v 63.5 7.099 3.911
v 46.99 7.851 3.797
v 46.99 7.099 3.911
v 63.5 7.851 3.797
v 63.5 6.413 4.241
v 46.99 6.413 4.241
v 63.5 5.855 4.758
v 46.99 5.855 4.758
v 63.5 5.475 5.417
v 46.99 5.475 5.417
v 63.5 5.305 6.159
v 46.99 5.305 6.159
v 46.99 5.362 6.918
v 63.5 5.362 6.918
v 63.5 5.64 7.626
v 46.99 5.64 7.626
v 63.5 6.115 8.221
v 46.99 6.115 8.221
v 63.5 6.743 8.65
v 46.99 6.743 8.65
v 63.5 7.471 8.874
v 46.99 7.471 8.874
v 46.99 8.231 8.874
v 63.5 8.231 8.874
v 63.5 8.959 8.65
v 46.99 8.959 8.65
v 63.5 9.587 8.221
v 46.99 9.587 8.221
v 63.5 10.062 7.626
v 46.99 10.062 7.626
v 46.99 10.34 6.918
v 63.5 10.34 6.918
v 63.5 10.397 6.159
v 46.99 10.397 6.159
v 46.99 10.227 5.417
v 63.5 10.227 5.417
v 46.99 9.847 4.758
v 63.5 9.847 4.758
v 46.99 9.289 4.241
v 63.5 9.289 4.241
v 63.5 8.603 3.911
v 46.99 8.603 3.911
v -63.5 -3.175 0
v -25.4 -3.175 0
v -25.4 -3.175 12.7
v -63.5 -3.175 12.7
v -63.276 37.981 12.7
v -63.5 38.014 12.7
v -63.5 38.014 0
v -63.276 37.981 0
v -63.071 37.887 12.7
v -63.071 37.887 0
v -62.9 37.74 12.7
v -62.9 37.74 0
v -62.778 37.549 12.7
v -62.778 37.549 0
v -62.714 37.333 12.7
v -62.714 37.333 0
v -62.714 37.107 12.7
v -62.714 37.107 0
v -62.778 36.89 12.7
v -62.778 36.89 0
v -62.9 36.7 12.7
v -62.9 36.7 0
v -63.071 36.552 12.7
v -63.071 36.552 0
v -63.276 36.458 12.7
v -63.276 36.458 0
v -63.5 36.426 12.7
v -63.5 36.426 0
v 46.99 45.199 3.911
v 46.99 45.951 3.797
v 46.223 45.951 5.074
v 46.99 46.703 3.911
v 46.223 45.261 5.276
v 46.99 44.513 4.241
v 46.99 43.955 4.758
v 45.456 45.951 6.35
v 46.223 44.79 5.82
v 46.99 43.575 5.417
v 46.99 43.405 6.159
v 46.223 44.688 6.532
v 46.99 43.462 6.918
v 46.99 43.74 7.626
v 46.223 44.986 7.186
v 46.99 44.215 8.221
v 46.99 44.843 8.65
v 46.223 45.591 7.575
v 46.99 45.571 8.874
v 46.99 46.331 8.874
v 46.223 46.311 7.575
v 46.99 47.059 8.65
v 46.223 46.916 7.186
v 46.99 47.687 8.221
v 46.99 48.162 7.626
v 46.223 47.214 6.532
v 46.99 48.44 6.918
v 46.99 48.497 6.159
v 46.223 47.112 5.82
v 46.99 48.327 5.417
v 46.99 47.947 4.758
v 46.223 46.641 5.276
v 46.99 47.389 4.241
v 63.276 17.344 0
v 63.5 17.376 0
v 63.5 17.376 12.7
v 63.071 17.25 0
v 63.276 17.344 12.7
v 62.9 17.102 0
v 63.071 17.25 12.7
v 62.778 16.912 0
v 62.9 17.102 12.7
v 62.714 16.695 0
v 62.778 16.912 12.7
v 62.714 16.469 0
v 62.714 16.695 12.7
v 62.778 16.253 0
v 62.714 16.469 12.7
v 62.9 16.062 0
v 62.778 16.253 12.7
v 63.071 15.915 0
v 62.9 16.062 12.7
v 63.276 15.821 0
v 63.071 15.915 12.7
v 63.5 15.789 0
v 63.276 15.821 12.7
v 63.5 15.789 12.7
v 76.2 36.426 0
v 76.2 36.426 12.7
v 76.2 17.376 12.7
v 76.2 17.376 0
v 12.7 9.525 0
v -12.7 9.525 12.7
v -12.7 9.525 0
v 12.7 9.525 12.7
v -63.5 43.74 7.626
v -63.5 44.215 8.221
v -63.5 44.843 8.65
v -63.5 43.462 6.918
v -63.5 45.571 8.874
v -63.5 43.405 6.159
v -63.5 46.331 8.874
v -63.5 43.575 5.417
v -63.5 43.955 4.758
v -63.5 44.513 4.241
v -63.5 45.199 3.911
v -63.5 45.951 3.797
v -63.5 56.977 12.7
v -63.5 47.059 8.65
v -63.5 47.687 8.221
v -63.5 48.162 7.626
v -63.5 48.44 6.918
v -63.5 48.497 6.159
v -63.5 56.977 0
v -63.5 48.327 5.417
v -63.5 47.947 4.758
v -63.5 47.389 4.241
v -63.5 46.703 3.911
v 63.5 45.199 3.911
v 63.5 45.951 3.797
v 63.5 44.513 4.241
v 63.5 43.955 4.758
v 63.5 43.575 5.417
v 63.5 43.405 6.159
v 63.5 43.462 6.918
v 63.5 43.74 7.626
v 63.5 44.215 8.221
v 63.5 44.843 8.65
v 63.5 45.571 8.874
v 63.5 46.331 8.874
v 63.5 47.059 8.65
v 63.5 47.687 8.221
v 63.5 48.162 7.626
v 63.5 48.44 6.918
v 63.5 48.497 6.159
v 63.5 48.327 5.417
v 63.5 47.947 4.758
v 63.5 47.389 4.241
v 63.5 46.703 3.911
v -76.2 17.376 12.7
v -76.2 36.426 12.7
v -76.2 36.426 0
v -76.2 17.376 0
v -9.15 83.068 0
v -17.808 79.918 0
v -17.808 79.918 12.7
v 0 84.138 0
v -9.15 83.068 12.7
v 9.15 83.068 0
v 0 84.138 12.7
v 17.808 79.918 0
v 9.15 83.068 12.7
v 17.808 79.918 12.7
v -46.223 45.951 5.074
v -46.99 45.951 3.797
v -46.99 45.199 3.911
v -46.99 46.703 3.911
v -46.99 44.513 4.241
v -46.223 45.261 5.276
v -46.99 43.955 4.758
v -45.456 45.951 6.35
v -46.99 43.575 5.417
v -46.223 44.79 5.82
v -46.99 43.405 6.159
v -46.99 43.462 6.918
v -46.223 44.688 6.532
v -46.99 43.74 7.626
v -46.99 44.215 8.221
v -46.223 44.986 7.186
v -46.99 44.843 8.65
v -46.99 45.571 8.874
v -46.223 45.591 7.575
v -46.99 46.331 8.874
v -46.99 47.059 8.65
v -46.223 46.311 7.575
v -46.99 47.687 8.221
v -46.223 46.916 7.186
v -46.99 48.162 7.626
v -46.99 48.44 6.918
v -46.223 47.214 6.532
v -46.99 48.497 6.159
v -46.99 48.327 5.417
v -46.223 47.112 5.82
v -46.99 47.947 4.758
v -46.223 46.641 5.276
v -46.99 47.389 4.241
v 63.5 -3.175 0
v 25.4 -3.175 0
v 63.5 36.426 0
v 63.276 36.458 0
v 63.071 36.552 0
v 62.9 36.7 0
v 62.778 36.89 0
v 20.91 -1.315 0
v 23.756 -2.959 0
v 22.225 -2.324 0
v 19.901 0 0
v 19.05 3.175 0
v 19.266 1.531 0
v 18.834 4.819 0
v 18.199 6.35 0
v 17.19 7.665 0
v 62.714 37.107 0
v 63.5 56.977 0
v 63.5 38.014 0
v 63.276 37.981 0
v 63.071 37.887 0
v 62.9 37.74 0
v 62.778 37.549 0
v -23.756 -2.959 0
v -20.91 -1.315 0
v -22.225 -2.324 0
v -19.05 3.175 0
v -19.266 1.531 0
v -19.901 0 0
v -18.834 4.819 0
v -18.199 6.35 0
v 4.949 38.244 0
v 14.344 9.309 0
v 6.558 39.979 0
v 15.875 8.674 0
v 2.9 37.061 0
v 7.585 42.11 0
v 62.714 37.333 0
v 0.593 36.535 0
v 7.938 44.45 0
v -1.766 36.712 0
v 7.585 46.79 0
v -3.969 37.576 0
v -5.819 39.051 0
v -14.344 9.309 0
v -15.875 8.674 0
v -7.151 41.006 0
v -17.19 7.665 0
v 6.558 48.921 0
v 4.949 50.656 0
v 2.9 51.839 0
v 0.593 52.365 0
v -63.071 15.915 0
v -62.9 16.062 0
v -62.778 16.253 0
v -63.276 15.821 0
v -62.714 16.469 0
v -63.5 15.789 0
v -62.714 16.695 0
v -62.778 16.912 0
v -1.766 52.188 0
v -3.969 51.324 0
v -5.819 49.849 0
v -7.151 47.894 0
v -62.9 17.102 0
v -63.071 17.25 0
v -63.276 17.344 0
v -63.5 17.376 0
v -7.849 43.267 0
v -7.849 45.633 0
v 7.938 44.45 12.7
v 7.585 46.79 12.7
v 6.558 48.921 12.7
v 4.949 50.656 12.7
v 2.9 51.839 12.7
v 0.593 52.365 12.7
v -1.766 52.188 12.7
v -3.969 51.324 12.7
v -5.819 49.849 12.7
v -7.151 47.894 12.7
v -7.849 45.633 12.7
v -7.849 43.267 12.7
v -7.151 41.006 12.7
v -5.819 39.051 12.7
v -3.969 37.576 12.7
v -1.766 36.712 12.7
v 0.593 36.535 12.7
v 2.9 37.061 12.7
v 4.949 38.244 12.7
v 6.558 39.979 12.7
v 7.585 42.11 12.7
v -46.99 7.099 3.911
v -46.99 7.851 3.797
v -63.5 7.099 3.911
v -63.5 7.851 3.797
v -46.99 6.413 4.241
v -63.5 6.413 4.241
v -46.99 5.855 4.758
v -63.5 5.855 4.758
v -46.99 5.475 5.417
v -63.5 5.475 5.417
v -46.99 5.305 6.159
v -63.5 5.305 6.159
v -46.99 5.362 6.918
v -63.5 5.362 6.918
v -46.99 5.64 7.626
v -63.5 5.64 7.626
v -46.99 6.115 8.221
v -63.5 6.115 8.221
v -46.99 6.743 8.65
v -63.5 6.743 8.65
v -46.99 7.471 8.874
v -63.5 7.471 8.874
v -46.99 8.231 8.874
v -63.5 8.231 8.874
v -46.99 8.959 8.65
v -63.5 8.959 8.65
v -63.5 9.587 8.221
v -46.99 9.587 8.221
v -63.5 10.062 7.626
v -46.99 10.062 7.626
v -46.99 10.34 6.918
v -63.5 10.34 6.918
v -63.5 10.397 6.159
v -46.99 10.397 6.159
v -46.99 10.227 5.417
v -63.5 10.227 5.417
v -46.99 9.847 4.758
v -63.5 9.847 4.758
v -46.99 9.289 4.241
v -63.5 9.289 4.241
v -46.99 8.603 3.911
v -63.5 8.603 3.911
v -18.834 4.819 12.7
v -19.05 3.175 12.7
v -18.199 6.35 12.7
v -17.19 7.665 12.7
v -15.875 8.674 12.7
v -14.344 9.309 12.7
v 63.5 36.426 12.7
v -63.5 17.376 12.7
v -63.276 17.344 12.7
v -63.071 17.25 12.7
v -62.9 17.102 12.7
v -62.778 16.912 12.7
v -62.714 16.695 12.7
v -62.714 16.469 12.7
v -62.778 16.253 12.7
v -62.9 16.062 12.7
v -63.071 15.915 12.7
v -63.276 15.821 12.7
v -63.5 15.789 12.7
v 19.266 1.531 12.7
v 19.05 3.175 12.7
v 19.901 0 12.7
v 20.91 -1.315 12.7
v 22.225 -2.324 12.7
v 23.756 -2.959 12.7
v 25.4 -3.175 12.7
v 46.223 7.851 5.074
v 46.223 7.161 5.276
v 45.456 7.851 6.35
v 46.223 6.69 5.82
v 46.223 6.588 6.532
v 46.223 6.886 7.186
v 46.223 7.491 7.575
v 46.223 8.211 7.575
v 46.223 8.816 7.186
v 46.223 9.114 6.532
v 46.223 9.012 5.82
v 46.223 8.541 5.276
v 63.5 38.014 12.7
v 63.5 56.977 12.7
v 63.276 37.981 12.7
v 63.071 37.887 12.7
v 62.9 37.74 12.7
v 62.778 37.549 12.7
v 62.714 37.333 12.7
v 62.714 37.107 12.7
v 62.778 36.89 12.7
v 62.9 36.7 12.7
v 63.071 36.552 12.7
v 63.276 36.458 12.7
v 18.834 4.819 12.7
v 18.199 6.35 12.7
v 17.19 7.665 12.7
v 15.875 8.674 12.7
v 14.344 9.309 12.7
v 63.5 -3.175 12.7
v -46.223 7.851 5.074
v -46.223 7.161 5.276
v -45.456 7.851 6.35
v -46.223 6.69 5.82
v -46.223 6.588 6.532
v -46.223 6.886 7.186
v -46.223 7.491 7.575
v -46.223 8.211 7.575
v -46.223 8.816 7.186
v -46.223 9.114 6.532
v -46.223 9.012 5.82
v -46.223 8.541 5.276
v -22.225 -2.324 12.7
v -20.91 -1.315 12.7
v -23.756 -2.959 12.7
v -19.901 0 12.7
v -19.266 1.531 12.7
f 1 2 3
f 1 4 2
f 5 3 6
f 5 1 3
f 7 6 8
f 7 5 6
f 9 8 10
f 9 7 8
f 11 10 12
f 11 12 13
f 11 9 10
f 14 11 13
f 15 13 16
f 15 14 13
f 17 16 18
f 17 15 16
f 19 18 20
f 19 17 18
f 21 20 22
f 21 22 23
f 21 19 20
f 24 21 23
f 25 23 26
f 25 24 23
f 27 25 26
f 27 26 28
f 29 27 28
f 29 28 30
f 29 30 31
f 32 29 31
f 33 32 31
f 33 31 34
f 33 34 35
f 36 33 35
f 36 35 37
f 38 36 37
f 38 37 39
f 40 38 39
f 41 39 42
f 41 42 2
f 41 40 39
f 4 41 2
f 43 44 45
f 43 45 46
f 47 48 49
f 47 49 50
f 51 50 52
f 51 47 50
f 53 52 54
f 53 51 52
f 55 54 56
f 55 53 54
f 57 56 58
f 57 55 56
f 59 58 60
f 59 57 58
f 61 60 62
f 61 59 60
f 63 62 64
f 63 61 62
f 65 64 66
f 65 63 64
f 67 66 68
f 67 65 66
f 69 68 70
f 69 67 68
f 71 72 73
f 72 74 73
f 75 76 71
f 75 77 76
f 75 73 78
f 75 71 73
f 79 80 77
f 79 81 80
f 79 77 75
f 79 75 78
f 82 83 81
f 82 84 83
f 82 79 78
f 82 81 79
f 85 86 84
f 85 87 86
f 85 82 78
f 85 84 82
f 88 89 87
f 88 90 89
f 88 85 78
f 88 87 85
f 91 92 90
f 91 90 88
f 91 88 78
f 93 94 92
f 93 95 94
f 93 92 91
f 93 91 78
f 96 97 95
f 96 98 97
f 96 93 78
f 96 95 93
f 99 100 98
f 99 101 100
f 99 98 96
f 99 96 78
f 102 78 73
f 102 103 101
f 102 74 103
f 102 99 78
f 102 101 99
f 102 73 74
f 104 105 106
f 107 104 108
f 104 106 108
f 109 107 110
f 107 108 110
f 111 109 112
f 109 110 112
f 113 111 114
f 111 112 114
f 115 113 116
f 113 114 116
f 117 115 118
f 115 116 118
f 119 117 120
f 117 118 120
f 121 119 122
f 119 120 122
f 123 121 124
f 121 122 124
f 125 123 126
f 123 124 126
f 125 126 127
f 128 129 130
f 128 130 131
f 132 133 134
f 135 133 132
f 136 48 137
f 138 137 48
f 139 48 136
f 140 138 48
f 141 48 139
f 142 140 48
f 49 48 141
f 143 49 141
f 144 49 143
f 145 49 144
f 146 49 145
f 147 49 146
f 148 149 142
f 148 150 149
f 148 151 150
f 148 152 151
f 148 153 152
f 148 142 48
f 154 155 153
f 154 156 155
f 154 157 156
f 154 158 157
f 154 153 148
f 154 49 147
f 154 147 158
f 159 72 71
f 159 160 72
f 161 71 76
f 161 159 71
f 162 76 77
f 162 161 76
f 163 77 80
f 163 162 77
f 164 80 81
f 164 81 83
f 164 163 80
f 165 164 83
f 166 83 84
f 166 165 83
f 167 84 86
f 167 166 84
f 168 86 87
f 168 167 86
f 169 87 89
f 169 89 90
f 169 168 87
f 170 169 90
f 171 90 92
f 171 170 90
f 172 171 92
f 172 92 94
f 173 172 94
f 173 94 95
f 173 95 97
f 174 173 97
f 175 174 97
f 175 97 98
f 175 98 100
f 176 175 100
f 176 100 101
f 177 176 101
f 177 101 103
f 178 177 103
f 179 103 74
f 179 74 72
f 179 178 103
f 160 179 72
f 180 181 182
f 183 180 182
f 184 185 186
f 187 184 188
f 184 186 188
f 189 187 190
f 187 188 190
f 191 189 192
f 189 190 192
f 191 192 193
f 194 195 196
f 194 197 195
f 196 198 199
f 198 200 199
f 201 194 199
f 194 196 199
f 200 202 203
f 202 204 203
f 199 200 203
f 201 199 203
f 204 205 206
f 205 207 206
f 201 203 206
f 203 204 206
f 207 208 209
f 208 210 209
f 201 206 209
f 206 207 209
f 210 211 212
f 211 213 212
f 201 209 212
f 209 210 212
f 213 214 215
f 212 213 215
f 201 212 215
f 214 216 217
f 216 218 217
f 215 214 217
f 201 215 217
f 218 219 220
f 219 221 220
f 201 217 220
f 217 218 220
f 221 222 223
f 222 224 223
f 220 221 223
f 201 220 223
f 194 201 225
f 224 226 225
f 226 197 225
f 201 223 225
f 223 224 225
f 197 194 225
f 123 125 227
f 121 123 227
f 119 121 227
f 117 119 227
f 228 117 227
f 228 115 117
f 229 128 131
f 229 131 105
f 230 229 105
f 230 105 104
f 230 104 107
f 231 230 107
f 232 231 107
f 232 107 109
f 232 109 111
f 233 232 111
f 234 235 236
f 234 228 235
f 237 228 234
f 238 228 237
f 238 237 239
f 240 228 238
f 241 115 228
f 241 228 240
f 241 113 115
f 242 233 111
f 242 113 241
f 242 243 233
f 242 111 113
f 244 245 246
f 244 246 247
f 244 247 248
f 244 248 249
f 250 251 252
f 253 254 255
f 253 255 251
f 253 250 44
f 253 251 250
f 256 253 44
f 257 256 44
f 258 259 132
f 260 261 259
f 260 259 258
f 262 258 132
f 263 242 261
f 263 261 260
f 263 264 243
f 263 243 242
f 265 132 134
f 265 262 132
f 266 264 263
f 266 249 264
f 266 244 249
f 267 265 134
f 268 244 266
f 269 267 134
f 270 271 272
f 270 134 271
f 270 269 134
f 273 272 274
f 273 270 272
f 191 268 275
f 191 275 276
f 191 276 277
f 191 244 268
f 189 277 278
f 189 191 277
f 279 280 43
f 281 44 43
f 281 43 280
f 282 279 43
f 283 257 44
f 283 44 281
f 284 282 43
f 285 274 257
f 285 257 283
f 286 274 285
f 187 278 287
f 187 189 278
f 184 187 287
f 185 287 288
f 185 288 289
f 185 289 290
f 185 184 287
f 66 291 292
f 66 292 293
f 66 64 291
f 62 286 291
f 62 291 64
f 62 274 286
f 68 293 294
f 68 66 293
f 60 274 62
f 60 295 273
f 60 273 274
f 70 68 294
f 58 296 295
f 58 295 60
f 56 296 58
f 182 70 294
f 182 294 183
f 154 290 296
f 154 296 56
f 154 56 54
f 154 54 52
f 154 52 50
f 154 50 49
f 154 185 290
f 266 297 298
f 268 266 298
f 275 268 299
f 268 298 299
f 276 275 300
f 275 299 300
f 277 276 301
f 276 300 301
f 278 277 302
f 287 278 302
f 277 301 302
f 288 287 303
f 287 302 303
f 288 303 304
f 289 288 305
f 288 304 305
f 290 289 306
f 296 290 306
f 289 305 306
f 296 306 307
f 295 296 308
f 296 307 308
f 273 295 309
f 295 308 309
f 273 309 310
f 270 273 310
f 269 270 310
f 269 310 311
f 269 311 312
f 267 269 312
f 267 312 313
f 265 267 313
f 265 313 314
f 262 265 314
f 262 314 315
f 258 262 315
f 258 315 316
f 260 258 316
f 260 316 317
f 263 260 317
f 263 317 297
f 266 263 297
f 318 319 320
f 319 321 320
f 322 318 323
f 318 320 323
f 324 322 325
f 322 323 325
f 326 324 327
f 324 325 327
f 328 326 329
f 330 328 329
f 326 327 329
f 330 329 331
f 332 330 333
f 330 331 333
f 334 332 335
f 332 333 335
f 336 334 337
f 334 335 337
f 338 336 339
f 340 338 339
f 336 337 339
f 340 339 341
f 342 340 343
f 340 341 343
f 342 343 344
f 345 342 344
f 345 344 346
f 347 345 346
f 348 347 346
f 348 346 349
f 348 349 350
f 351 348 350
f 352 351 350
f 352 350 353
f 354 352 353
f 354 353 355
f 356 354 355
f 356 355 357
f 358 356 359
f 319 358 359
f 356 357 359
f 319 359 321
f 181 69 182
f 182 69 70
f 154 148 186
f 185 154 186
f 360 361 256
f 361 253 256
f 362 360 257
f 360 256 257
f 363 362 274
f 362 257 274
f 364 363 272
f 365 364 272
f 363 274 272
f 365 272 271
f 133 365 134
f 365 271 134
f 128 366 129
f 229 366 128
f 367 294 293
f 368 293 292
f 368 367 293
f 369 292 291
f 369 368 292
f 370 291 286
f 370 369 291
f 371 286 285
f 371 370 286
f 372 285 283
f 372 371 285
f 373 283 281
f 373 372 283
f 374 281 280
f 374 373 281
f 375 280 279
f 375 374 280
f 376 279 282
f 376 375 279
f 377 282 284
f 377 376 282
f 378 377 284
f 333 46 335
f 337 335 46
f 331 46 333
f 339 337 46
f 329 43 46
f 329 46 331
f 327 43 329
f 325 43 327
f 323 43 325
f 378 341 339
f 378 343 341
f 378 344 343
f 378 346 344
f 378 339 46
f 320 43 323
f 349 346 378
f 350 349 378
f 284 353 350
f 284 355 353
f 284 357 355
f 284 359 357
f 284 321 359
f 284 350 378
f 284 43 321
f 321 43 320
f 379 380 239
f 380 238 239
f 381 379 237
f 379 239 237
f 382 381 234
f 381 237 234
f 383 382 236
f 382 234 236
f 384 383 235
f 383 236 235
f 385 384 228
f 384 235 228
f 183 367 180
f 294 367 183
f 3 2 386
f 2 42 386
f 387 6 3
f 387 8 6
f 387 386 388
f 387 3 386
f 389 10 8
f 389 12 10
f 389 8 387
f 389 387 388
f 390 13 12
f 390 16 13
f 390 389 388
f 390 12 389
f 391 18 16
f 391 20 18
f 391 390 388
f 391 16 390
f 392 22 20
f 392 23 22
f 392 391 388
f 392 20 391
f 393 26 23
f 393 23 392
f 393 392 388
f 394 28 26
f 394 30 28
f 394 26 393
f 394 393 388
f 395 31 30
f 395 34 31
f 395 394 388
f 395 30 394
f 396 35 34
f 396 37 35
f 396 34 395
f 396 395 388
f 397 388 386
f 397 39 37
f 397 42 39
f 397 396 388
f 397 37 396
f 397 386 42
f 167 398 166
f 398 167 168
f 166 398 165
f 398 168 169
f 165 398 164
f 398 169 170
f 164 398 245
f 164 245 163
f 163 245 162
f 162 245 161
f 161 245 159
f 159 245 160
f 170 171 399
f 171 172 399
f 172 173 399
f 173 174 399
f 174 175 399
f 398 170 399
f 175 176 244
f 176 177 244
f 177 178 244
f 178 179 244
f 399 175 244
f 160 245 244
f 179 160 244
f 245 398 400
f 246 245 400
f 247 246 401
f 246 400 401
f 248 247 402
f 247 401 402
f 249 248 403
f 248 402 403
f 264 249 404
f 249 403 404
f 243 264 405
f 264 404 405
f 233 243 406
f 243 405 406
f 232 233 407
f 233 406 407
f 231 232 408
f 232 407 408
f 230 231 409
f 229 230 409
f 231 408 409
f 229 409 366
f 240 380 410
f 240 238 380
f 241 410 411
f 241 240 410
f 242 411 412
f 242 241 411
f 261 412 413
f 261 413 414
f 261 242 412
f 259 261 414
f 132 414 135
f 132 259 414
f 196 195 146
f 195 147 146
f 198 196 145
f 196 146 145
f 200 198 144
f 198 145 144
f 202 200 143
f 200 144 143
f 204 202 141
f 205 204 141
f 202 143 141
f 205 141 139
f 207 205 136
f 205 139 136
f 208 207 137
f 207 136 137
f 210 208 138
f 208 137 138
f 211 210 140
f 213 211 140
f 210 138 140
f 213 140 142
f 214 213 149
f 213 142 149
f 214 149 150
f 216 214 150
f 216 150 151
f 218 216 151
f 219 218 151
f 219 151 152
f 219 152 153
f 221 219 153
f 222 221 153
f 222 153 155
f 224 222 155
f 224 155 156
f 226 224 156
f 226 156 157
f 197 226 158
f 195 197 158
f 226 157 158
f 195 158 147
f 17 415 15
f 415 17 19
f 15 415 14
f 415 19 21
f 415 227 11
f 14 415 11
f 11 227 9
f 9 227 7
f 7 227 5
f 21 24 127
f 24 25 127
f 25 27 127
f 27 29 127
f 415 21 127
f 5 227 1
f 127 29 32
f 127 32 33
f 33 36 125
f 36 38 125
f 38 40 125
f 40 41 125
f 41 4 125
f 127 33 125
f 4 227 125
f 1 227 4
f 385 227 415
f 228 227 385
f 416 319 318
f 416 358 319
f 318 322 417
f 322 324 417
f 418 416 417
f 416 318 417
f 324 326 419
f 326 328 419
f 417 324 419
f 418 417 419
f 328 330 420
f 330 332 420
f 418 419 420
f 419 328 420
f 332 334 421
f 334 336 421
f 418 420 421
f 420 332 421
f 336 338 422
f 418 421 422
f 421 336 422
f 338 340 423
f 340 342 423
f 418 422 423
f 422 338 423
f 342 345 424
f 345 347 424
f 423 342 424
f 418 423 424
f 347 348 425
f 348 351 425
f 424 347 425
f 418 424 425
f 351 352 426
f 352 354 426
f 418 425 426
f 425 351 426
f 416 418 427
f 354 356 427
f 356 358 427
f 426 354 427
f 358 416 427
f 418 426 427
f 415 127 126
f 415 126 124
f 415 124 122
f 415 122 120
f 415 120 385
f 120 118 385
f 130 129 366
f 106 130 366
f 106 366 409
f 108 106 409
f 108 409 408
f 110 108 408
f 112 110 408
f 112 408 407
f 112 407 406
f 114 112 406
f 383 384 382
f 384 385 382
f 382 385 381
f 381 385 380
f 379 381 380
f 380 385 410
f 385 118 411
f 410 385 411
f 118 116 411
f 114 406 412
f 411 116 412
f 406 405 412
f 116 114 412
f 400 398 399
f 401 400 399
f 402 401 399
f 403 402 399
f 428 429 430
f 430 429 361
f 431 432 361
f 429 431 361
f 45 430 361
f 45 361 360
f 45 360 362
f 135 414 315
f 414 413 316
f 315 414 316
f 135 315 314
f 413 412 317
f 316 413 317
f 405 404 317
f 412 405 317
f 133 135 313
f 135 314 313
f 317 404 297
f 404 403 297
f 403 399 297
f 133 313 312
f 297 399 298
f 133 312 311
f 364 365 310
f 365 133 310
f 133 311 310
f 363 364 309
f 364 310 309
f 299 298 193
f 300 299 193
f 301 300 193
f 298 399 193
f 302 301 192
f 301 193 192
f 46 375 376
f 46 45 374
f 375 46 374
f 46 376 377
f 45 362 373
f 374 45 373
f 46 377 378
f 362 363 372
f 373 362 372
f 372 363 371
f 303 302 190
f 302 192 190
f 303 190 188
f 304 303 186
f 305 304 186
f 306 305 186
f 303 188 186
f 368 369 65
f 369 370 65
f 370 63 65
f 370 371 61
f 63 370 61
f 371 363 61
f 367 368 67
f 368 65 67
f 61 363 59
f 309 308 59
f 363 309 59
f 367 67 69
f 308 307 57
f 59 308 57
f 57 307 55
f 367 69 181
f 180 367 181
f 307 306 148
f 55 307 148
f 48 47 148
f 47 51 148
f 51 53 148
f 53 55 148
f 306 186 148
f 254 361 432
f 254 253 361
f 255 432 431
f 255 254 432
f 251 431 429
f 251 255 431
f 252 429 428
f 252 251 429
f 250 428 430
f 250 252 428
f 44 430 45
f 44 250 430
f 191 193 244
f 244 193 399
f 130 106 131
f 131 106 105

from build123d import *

# Parameters (mm, degrees)
SKETCH1_W                        = 127
SKETCH1_H                        = 152.4
BOSS_EXTRUDE1_DEPTH              = 12.7
SKETCH2_R                        = 7.9375
CUT_EXTRUDE1_DEPTH               = 166.587741092
SKETCH3_W                        = 127
SKETCH3_H                        = 3.175
BOSS_EXTRUDE2_DEPTH              = 12.7
SKETCH4_W                        = 38.1
SKETCH4_H                        = 12.7
CUT_EXTRUDE2_DEPTH               = 107.172778556
FILLET1_R                        = 6.35
F_1_4_20_TAPPED_HOLE1_AT_2_COUNT = 2
F_1_4_20_TAPPED_HOLE1_AT_2_PITCH = 38.1
SKETCH7_W                        = 12.7
SKETCH7_H                        = 19.05
BOSS_EXTRUDE3_DEPTH              = 12.7
SKETCH8_R                        = 0.79375
CUT_EXTRUDE3_DEPTH               = 115.222803793


with BuildPart() as part:
    # Sketch1 → Boss-Extrude1 (new body)
    with BuildSketch(Plane.XY):
        with Locations((0, 76.2)):
            Rectangle(SKETCH1_W, SKETCH1_H)
    extrude(amount=BOSS_EXTRUDE1_DEPTH)

    # Sketch2 → Cut-Extrude1 (cut, through all)
    with BuildSketch(Plane.XY.offset(12.7)):
        with BuildLine():
            Line((-63.5, 152.4), (-63.5, 56.977000238))
            Line((-63.5, 56.977000238), (-17.807704814, 79.918060357))
            ThreePointArc((-17.807704814, 79.918060357), (0, 84.1375), (17.807704814, 79.918060357))
            Line((17.807704814, 79.918060357), (63.5, 56.977000238))
            Line((63.5, 56.977000238), (63.5, 152.4))
            Line((63.5, 152.4), (-63.5, 152.4))
        make_face()
        with Locations((0, 44.45)):
            Circle(SKETCH2_R)
    extrude(amount=-CUT_EXTRUDE1_DEPTH, mode=Mode.SUBTRACT)

    # Sketch3 → Boss-Extrude2 (add)
    with BuildSketch(Plane(origin=(0, 0, 0), x_dir=(-1, 0, 0), z_dir=(0, 0, -1))):
        with Locations((0, -1.5875)):
            Rectangle(SKETCH3_W, SKETCH3_H)
    extrude(amount=-BOSS_EXTRUDE2_DEPTH)

    # Sketch4 → Cut-Extrude2 (cut, through all)
    with BuildSketch(Plane.XY.offset(12.7)):
        with Locations((0, 3.175)):
            Rectangle(SKETCH4_W, SKETCH4_H)
    extrude(amount=-CUT_EXTRUDE2_DEPTH, mode=Mode.SUBTRACT)

    # Fillet1
    fillet1_edges = [part.edges().sort_by_distance(p)[0] for p in [
        (-19.05, 9.525, 6.35),
        (19.05, 9.525, 6.35),
    ]]
    fillet(fillet1_edges, radius=FILLET1_R)
    fillet1_2_edges = [part.edges().sort_by_distance(p)[0] for p in [
        (-19.05, -3.175, 6.35),
        (19.05, -3.175, 6.35),
    ]]
    fillet(fillet1_2_edges, radius=FILLET1_R - 0.0001)  # a hair under: the kernel refuses the full size

    # Sketch5 → 1/4-20 Tapped Hole1 (revolve, cut)
    with BuildSketch(Plane(origin=(63.5, 45.951000119, 6.35), x_dir=(0, 0, -1), z_dir=(0, 1, 0))):
        Polygon((0, 0), (0, 18.043816902), (2.5527, 16.51), (2.5527, 0), align=None)
    f_1_4_20_tapped_hole1 = revolve(axis=Axis((69.85, 45.951000119, 6.35), (-1, 0, 0)), mode=Mode.SUBTRACT)

    # 1/4-20 Tapped Hole1 at 2: 1/4-20 Tapped Hole1 ×2
    with Locations(*[(0, -i * F_1_4_20_TAPPED_HOLE1_AT_2_PITCH, 0) for i in range(1, F_1_4_20_TAPPED_HOLE1_AT_2_COUNT)]):
        add(f_1_4_20_tapped_hole1, mode=Mode.SUBTRACT)

    # Sketch7 → Boss-Extrude3 (add)
    with BuildSketch(Plane(origin=(63.5, 0, 0), x_dir=(0, 0, -1), z_dir=(1, 0, 0))):
        with Locations((-6.35, 26.901000119)):
            Rectangle(SKETCH7_W, SKETCH7_H)
    boss_extrude3 = extrude(amount=BOSS_EXTRUDE3_DEPTH)

    # Sketch8 → Cut-Extrude3 (cut, through all)
    with BuildSketch(Plane.XY.offset(12.7)):
        with Locations((63.5, 37.219750119)):
            Circle(SKETCH8_R)
        with Locations((63.5, 16.582250119)):
            Circle(SKETCH8_R)
    cut_extrude3 = extrude(amount=-CUT_EXTRUDE3_DEPTH, mode=Mode.SUBTRACT)

    # Mirror1: 1/4-20 Tapped Hole1, Boss-Extrude3, Cut-Extrude3 across plane
    add(f_1_4_20_tapped_hole1.mirror(Plane(origin=(0, 0, 0), x_dir=(0, 0, 1), z_dir=(1, 0, 0))), mode=Mode.SUBTRACT)
    add(boss_extrude3.mirror(Plane(origin=(0, 0, 0), x_dir=(0, 0, 1), z_dir=(1, 0, 0))))
    add(cut_extrude3.mirror(Plane(origin=(0, 0, 0), x_dir=(0, 0, 1), z_dir=(1, 0, 0))), mode=Mode.SUBTRACT)

    # Mirror1 copy 1 sketch → Mirror1 copy 1 (revolve, cut)
    with BuildSketch(Plane(origin=(-63.5, 7.851000119, 6.35), x_dir=(0, 0, -1), z_dir=(0, 1, 0))):
        Polygon((0, 0), (0, -18.043816902), (2.5527, -16.51), (2.5527, 0), align=None)
    revolve(axis=Axis((-69.85, 7.851000119, 6.35), (-1, 0, 0)), mode=Mode.SUBTRACT)


solid = part.part
